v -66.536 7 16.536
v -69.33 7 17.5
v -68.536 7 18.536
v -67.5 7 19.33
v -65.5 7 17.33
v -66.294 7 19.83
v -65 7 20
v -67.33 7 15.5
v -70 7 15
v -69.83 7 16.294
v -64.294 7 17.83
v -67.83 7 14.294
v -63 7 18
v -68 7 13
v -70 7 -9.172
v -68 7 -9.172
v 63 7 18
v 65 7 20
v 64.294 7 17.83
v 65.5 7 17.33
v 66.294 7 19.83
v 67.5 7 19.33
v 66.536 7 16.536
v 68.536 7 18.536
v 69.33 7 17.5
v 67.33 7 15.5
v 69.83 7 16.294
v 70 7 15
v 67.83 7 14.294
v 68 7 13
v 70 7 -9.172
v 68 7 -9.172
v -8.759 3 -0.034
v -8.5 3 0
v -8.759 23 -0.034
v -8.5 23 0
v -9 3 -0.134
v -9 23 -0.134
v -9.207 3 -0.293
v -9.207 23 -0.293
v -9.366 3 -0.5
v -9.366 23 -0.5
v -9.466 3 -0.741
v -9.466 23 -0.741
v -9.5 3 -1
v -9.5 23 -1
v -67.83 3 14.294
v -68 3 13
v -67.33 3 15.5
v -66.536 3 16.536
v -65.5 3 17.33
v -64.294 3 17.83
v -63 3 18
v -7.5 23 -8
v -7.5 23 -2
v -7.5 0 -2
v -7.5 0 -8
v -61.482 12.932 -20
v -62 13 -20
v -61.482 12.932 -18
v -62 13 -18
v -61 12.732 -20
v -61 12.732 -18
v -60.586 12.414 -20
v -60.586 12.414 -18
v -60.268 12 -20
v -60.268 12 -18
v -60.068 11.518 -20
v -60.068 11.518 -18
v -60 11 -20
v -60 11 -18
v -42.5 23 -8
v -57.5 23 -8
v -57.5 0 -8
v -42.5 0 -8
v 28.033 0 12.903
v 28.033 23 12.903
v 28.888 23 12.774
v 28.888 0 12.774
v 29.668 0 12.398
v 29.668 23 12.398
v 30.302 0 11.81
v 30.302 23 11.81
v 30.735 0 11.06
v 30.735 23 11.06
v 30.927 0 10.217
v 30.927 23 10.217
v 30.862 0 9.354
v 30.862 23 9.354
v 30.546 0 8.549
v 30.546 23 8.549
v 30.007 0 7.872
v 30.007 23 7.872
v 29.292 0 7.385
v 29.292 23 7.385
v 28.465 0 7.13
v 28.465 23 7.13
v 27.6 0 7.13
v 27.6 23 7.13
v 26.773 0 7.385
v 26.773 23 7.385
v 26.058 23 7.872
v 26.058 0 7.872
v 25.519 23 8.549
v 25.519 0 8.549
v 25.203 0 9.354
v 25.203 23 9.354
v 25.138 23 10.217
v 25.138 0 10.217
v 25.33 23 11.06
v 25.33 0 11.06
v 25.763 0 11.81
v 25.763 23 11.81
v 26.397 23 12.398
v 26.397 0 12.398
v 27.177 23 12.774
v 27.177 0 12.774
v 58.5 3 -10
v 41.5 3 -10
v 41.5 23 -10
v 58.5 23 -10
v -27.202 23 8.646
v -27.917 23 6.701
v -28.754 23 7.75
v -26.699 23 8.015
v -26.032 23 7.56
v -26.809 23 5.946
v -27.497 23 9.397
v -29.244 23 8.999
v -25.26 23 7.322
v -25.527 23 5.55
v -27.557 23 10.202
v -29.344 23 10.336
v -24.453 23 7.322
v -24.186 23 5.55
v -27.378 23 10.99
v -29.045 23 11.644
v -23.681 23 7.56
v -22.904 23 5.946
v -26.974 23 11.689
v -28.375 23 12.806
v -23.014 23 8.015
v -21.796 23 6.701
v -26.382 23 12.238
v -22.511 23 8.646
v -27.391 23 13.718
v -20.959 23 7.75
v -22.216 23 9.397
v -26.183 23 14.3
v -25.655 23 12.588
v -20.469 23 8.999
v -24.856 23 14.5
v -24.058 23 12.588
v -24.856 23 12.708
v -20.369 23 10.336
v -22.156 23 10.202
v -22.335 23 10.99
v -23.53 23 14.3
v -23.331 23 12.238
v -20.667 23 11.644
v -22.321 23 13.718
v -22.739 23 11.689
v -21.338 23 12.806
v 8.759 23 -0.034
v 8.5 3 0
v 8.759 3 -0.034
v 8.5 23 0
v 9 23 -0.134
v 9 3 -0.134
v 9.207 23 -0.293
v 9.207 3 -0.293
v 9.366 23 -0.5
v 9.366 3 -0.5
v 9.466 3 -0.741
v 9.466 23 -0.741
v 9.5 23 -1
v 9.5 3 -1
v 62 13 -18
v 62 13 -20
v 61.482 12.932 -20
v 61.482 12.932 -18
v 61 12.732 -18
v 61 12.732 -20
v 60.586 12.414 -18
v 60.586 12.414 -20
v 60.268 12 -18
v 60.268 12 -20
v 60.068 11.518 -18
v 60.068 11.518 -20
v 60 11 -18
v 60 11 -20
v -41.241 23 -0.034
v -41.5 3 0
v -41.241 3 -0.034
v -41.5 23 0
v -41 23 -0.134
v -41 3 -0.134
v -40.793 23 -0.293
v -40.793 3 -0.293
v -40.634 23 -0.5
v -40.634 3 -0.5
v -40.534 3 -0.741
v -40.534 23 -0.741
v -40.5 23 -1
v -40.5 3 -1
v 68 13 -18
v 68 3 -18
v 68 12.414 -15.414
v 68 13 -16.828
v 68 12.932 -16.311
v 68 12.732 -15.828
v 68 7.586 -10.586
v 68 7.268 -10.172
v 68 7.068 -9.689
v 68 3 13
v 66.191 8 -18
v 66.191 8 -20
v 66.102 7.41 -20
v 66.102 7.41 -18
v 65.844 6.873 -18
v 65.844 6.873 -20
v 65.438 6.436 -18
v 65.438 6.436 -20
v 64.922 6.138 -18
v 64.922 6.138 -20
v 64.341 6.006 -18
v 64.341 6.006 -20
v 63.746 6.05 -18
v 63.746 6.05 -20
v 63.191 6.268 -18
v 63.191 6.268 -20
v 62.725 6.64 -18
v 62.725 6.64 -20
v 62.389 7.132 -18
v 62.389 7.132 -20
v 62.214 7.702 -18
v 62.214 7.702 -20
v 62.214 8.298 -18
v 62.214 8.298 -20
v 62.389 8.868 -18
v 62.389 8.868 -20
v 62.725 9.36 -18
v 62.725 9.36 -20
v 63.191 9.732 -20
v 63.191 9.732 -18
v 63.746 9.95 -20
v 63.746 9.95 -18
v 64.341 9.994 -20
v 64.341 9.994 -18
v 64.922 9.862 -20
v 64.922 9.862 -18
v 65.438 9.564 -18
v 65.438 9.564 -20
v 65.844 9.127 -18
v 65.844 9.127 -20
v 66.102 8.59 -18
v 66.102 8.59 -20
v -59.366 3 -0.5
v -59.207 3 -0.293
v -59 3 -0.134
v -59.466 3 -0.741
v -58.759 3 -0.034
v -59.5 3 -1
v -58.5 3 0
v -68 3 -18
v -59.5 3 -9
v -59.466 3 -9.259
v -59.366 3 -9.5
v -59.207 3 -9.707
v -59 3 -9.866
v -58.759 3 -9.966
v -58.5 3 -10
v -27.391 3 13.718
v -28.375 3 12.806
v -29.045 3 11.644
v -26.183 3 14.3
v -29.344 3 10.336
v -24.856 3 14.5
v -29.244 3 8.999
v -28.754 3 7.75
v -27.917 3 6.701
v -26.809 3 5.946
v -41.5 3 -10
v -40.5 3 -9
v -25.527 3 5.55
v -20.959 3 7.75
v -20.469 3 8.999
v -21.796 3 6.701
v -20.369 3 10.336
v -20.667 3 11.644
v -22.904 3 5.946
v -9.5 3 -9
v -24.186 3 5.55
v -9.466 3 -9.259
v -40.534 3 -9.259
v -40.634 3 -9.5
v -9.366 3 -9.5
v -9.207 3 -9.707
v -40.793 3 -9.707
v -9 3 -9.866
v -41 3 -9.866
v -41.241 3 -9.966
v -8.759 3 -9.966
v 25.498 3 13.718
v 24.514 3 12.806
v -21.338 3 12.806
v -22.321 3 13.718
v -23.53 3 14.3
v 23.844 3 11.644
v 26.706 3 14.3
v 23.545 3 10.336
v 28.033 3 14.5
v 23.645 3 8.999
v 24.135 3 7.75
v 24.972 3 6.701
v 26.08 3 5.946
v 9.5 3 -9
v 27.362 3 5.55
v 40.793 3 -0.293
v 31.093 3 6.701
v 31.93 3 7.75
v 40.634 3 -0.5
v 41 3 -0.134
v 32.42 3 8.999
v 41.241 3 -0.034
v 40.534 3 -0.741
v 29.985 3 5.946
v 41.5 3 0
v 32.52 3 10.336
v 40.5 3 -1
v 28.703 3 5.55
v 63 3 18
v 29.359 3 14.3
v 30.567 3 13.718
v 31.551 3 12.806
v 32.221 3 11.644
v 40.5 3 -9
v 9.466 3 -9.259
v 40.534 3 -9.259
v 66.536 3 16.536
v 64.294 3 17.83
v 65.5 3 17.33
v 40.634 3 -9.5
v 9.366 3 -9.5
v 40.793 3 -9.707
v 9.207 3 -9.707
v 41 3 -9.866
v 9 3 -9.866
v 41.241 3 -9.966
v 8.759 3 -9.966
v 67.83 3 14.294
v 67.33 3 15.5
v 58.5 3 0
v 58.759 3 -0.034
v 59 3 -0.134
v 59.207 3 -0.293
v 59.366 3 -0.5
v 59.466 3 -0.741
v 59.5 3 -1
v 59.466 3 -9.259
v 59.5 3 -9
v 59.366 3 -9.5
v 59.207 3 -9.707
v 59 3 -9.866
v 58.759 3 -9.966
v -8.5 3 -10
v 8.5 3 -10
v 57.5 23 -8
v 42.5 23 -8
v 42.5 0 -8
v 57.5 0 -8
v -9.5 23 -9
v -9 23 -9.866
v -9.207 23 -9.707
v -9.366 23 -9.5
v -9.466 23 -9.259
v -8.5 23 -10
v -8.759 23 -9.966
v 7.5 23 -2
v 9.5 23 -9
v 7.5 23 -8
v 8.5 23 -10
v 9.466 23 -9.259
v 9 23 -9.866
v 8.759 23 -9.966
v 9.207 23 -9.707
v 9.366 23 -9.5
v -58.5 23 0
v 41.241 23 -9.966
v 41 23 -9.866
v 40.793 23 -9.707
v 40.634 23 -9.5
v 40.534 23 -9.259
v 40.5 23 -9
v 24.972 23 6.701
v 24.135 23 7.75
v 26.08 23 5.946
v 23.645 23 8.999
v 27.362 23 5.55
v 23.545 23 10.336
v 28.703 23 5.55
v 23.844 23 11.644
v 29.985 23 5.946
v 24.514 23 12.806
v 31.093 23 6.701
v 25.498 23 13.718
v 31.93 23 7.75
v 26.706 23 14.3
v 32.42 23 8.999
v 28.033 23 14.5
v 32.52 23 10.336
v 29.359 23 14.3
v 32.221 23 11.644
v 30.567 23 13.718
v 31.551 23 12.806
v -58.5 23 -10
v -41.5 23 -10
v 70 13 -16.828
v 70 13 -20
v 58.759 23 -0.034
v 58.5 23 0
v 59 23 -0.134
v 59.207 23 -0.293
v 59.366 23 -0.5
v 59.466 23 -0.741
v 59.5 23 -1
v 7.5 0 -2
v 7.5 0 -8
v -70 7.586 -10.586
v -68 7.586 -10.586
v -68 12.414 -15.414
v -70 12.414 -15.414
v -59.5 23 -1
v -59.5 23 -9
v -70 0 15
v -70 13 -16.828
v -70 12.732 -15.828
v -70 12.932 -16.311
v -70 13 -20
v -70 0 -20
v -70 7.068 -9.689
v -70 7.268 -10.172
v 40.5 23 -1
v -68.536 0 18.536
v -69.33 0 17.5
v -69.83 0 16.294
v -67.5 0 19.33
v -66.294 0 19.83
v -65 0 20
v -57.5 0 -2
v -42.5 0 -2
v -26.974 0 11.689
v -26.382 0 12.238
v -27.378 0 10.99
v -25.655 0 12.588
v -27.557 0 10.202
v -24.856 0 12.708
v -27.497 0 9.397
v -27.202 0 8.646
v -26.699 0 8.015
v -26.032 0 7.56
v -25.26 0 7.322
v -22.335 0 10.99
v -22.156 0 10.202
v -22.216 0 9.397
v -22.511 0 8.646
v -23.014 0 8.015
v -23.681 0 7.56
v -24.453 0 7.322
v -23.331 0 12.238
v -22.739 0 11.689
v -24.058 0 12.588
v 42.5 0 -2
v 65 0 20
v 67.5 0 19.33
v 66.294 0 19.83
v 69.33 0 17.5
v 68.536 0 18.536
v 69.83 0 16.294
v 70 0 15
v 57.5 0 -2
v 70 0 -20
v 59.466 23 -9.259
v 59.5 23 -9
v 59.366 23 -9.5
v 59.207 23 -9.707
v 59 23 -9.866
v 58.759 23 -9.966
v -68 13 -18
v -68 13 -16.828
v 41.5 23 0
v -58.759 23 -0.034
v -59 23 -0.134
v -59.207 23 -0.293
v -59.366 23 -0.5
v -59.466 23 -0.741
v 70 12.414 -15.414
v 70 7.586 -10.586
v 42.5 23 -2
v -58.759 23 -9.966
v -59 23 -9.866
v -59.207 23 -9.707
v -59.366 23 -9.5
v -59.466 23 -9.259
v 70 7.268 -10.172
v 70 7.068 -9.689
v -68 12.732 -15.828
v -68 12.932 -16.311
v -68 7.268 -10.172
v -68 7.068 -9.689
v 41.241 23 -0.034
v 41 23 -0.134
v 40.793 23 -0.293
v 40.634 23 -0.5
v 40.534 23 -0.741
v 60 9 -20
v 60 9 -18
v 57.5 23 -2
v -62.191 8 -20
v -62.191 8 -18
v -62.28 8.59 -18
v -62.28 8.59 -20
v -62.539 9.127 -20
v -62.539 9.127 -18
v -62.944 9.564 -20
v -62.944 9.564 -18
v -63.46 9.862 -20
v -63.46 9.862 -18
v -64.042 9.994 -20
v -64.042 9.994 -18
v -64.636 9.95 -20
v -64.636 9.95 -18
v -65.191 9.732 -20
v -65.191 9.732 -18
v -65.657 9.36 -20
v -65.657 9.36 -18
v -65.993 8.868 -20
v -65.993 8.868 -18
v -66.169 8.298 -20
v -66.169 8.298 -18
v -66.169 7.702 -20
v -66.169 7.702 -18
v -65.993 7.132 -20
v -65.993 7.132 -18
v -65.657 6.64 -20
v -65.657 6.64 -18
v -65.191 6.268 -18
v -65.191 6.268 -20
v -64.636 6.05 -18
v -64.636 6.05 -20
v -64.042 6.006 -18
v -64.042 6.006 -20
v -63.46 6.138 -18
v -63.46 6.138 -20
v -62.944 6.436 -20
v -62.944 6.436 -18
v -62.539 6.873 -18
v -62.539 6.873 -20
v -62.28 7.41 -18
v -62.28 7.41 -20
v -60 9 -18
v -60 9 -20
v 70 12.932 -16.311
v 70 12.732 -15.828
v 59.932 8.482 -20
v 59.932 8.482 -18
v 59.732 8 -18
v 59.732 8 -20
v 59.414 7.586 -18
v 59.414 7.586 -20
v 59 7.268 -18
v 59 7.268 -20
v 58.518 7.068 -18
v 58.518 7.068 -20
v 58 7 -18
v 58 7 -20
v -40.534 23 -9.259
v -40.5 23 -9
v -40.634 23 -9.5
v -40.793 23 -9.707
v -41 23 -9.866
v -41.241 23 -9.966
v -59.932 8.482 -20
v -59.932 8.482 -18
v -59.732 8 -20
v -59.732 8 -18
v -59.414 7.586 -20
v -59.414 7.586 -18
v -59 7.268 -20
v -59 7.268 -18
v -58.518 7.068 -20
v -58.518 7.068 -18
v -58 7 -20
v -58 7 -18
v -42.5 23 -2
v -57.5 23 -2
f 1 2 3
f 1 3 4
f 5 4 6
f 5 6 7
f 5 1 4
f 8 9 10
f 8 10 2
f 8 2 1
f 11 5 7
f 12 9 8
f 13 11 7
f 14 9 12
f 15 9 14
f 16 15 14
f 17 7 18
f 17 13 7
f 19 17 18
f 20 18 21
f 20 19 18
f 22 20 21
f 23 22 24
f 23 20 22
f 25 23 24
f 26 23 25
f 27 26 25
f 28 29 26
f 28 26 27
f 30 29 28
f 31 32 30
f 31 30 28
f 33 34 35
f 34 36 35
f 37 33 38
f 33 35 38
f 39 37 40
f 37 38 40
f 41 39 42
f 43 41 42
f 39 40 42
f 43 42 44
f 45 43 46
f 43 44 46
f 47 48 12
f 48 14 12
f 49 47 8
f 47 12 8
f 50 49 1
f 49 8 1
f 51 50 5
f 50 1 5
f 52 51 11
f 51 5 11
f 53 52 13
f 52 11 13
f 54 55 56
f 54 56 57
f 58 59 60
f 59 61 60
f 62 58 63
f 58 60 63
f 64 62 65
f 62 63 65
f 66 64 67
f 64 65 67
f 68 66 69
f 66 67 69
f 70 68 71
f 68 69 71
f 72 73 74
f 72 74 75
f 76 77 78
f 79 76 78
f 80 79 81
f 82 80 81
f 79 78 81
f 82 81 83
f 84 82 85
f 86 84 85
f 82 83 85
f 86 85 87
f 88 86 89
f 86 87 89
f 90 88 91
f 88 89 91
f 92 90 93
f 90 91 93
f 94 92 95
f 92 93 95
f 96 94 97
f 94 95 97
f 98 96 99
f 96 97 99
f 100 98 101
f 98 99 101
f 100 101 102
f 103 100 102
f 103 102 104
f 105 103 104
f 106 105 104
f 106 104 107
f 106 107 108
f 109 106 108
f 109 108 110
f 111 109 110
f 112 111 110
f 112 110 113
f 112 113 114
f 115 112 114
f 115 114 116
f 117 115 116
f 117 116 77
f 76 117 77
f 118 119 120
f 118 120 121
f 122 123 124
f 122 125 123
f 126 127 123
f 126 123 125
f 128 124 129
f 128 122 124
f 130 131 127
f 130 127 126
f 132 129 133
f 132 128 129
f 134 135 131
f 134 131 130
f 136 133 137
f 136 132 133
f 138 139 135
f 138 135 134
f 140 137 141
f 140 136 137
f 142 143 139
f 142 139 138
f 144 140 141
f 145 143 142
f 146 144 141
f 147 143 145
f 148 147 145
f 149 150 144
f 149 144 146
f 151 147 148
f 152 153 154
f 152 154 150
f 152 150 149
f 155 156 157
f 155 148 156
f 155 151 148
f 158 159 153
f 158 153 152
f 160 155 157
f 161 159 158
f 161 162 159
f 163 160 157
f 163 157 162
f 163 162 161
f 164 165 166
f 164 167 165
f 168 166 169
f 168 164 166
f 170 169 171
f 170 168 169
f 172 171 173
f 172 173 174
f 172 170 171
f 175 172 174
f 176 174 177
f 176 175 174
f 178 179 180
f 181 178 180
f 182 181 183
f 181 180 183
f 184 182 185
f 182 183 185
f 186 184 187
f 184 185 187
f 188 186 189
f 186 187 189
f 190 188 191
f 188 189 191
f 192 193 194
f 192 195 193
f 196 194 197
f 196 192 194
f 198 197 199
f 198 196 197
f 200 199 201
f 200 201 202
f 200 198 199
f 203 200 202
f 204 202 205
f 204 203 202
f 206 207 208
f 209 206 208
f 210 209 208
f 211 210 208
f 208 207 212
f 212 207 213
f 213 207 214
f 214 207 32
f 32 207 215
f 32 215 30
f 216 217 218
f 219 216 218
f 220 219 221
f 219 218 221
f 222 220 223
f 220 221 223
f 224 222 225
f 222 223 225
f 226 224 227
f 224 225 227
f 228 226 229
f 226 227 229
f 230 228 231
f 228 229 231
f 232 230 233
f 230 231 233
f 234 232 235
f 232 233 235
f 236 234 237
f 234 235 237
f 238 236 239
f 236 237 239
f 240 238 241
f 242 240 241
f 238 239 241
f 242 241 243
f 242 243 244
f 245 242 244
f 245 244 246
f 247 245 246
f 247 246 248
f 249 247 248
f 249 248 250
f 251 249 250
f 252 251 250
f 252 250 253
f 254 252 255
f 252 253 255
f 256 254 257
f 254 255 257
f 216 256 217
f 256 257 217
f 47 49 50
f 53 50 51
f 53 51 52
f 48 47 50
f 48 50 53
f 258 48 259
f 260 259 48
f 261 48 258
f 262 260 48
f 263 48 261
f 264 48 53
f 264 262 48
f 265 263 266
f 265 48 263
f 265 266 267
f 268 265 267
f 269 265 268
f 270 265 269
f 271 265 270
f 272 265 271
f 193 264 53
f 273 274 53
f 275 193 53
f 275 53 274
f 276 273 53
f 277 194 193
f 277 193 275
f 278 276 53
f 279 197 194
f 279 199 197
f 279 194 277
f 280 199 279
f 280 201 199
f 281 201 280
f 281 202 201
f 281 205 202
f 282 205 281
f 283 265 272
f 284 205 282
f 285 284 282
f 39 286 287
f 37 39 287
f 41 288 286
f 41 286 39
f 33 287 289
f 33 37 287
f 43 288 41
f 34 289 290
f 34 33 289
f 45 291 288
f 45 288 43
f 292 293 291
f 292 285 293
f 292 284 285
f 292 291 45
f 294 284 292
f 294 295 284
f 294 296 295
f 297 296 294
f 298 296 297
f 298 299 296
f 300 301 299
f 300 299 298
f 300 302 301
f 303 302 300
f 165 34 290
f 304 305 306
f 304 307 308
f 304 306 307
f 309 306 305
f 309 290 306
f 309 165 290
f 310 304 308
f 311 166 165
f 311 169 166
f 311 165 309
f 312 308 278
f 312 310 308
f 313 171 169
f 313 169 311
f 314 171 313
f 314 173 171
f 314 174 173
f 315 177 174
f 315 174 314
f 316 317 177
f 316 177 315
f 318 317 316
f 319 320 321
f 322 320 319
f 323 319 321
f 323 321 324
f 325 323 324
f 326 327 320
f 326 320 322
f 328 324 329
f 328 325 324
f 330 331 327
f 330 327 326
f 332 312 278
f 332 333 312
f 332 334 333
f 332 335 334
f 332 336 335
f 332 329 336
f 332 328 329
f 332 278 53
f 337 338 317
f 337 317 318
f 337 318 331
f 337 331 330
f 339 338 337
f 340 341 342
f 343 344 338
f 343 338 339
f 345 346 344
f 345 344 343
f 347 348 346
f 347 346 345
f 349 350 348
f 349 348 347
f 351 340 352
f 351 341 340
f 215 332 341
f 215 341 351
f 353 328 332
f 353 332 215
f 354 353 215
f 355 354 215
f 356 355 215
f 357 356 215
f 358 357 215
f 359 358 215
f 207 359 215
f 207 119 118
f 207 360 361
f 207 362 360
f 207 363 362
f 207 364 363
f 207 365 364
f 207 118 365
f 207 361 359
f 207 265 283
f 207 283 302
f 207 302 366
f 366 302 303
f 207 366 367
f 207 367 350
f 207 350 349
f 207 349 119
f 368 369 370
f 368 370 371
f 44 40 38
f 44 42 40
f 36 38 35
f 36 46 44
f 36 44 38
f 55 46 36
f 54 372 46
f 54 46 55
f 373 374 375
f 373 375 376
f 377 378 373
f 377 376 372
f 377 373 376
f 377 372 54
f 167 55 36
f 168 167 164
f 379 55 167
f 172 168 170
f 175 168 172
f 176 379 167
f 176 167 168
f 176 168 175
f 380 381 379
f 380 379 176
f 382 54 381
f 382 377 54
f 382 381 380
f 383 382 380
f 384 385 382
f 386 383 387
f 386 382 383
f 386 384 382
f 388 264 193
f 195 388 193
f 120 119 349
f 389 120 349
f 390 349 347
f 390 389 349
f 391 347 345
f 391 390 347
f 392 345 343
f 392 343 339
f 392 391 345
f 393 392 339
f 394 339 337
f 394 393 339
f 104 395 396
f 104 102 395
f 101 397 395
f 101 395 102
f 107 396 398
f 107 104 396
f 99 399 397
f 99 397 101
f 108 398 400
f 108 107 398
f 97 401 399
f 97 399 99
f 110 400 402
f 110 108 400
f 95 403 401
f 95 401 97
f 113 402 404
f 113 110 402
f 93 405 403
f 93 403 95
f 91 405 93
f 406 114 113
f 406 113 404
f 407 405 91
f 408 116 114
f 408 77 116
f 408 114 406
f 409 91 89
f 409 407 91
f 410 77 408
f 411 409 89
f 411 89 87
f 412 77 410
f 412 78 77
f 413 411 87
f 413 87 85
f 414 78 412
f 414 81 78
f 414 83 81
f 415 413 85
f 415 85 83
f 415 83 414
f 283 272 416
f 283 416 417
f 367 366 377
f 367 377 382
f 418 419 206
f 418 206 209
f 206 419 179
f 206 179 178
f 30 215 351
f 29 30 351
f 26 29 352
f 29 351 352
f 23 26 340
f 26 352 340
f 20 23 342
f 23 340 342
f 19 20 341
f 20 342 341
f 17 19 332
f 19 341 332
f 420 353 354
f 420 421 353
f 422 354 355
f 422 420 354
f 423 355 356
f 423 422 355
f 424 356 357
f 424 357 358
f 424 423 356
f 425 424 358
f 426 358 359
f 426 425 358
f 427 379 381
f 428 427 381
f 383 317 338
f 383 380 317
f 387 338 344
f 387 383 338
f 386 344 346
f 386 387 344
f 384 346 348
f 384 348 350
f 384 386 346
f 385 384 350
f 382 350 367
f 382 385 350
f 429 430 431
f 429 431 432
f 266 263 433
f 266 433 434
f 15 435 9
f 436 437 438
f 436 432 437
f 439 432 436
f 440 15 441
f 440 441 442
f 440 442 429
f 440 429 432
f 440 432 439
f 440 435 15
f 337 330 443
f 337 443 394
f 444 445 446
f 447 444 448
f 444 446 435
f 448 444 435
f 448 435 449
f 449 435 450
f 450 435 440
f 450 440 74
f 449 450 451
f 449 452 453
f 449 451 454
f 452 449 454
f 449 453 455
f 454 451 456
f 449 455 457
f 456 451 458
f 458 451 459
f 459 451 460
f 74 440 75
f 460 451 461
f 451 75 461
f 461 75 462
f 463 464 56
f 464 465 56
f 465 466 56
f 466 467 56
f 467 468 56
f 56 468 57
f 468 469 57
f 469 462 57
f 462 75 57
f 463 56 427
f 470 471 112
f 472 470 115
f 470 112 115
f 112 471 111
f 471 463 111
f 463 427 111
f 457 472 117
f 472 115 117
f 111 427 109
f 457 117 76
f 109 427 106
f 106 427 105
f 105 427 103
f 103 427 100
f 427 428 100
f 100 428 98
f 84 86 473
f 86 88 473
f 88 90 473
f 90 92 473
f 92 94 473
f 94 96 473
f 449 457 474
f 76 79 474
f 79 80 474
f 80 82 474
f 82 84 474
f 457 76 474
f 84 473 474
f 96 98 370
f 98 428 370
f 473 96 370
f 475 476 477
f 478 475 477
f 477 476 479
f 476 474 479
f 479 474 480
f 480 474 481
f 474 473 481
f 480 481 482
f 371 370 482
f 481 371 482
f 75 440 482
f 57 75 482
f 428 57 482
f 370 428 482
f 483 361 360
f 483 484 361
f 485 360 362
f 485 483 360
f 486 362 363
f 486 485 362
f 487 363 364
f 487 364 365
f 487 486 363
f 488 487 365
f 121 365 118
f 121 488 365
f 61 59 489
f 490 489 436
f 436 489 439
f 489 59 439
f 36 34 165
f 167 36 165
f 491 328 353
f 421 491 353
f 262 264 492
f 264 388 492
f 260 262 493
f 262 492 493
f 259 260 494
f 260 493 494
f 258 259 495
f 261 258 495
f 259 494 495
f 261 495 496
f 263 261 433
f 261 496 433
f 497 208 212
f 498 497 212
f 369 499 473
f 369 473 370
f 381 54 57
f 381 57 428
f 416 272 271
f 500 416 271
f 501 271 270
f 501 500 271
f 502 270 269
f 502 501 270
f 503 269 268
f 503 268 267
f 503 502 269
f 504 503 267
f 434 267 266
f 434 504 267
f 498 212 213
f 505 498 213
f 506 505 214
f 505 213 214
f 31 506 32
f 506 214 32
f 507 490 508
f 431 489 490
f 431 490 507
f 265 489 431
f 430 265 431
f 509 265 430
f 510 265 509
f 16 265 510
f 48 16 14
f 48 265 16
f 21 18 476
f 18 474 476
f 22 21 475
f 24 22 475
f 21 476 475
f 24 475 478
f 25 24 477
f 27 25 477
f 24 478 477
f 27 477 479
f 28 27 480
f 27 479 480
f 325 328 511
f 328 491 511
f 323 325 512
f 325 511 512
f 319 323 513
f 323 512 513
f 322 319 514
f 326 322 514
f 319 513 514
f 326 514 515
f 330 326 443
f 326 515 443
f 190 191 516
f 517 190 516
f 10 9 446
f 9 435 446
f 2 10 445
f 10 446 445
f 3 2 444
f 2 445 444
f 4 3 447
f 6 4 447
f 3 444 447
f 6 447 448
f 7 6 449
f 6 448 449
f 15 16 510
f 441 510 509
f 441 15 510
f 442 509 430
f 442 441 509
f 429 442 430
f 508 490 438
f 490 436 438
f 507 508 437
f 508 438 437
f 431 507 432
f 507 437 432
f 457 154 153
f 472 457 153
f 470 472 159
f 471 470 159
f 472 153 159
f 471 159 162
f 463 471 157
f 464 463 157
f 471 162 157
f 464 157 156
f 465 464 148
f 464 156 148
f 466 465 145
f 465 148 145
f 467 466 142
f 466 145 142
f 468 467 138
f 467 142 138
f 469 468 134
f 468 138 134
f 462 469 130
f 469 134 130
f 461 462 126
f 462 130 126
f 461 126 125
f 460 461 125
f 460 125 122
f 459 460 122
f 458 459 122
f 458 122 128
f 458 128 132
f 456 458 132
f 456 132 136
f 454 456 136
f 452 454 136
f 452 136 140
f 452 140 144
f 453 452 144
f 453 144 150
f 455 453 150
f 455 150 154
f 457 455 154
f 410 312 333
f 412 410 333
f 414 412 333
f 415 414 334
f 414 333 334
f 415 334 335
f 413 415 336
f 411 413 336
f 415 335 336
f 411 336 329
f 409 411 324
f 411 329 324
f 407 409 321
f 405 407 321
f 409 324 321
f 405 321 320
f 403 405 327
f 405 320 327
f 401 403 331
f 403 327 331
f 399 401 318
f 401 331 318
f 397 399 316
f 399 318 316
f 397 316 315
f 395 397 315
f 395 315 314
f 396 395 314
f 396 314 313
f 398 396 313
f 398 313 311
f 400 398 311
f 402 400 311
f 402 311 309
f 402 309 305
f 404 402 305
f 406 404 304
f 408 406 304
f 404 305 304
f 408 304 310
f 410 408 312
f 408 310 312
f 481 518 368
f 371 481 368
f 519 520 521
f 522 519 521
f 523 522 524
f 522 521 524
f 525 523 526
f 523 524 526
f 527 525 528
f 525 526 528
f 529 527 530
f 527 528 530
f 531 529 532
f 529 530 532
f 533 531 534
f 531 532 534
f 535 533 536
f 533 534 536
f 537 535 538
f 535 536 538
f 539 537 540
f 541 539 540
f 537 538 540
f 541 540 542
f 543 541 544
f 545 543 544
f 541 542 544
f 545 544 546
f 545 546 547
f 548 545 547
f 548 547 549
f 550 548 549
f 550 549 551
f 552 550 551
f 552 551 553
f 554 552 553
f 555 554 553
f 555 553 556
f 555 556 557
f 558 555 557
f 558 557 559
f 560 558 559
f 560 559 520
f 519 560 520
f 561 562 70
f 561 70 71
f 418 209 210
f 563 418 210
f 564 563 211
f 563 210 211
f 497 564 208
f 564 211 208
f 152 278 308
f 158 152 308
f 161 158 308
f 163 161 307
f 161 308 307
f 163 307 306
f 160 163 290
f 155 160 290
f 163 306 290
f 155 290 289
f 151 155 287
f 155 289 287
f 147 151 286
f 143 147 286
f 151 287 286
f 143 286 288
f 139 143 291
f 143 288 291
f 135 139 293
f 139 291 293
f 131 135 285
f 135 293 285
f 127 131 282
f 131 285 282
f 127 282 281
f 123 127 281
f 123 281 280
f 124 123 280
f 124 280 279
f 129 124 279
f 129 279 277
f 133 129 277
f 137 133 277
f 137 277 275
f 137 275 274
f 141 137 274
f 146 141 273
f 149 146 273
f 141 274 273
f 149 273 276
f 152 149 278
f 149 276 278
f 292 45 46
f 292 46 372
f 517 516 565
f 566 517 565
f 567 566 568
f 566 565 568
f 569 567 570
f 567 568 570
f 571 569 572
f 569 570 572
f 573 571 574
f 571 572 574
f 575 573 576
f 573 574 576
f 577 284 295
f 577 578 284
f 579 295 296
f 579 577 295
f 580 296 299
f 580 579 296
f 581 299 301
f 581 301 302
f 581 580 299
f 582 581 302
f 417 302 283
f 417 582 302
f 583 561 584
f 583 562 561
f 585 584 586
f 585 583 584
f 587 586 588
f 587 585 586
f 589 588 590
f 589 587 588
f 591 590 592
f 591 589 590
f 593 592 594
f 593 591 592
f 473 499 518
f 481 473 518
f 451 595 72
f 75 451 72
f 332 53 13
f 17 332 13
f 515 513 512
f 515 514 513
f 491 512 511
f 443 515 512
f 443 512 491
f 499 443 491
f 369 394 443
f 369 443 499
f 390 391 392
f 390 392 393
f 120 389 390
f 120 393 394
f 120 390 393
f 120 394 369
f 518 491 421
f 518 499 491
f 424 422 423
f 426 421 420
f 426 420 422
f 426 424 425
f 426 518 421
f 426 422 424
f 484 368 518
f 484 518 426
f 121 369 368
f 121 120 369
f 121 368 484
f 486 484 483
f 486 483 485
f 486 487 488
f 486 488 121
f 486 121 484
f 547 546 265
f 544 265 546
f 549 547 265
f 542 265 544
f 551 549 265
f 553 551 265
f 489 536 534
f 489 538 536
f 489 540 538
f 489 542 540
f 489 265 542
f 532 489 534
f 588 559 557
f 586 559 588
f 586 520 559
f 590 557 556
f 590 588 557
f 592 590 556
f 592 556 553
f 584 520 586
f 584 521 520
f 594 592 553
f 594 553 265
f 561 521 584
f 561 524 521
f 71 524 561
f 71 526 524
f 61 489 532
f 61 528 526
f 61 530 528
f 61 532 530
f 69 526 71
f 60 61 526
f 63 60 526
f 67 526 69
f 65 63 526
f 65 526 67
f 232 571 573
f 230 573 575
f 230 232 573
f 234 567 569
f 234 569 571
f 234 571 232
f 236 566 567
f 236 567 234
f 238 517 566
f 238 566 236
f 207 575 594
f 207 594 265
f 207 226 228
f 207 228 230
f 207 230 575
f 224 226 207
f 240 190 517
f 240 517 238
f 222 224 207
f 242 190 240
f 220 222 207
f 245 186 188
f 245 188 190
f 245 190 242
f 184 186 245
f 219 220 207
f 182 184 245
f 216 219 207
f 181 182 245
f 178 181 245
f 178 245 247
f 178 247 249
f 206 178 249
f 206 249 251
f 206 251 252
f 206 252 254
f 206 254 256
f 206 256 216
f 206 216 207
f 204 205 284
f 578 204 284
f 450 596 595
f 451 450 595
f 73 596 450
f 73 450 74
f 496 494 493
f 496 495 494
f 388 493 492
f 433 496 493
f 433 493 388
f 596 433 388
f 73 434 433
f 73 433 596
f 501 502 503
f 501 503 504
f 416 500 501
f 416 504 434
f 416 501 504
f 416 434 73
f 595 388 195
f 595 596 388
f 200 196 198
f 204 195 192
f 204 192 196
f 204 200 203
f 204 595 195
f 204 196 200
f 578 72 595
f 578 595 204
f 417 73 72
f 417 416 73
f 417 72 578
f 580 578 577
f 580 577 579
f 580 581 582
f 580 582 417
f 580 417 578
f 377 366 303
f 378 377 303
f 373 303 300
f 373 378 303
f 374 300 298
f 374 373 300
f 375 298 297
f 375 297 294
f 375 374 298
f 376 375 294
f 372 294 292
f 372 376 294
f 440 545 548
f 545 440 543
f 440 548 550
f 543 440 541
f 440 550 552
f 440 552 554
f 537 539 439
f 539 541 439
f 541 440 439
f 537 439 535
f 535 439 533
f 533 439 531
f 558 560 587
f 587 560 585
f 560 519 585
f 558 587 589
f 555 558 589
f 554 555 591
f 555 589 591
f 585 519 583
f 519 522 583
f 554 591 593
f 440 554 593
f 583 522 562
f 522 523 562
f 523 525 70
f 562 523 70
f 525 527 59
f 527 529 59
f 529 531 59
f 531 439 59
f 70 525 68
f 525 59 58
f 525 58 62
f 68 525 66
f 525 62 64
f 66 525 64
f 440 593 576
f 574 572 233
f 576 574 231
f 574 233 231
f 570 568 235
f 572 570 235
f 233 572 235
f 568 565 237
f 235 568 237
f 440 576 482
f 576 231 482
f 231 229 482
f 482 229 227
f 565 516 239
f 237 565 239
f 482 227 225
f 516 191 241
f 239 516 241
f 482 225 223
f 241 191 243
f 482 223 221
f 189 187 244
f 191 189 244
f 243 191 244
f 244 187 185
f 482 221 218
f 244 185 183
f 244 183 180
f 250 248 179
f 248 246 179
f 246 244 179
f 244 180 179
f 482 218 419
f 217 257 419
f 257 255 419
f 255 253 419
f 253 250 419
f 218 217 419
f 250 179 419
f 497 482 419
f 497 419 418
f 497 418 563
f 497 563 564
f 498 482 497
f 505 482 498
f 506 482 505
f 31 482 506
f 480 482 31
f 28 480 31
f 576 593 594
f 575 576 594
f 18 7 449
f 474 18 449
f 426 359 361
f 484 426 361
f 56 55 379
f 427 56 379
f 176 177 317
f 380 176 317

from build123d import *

# Parameters (mm, degrees)
ESQUISSE1_W                      = 140
ESQUISSE1_H                      = 40
BOSS_EXTRU_1_DEPTH               = 3
BOSS_EXTRU_5_DEPTH               = 10
CHANFREIN1_SIZE                  = 6
ESQUISSE15_R                     = 2
ENL_V_MAT_EXTRU_7_DEPTH          = 81.703159789
ESQUISSE18_W                     = 60
ESQUISSE18_H                     = 2
BOSS_EXTRU_6_DEPTH               = 4
CONG_2_R                         = 5
CONG_3_R                         = 2
SYM_TRIE1_OUTLINE_W              = 4
SYM_TRIE1_OUTLINE_H              = 2
SYM_TRIE1_DEPTH                  = 62.191181732
SYM_TRIE1_START                  = 68
SYM_TRIE1_2_DEPTH                = 2
SYM_TRIE1_START_2                = 66.191181932
SYM_TRIE1_3_OUTLINE_W            = 10
SYM_TRIE1_3_OUTLINE_H            = 2
SYM_TRIE1_3_OUTLINE_W_2          = 4
SYM_TRIE1_3_DEPTH                = 1.808818068
SYM_TRIE1_START_3                = 62
SYM_TRIE1_4_OUTLINE_W            = 4
SYM_TRIE1_4_OUTLINE_H            = 2
SYM_TRIE1_4_DEPTH                = 6
SYM_TRIE1_5_OUTLINE_W            = 6
SYM_TRIE1_5_OUTLINE_H            = 2
SYM_TRIE1_5_DEPTH                = 0.191181732
SYM_TRIE1_START_4                = -20
SYM_TRIE1_6_DEPTH                = 2
SYM_TRIE1_START_5                = 2
SYM_TRIE1_7_DEPTH                = 5
CONG_4_R                         = 5
ESQUISSE2_W                      = 19
ESQUISSE2_H                      = 10
BOSS_EXTRU_7_DEPTH               = 20
ESQUISSE19_W                     = 15
ESQUISSE19_H                     = 6
ENL_V_MAT_EXTRU_8_DEPTH          = 77.347887987
CONG_5_R                         = 1
R_P_TITION_LIN_AIRE1_COUNT       = 3
R_P_TITION_LIN_AIRE1_PITCH       = 50
CONG_5_OF_R_P_TITION_LIN_AIRE1_R = 1
ESQUISSE23_R                     = 4.5
BOSS_EXTRU_9_DEPTH               = 20
ESQUISSE24_R                     = 2.70848906
ESQUISSE24_R_2                   = 2.902672956
ENL_V_MAT_EXTRU_10_DEPTH         = 77.347887987


with BuildPart() as part:
    # Esquisse1 → Boss.-Extru.1 (new body)
    with BuildSketch(Plane(origin=(0, 0, 0), x_dir=(1, 0, 0), z_dir=(0, 1, 0))):
        Rectangle(ESQUISSE1_W, ESQUISSE1_H)
    extrude(amount=BOSS_EXTRU_1_DEPTH)

    # Esquisse13 → Boss.-Extru.5 (add)
    with BuildSketch(Plane(origin=(0, 3, 0), x_dir=(1, 0, 0), z_dir=(0, 1, 0))):
        Polygon((-70, 20), (-60, 20), (-60, 18), (-68, 18), (-68, 10), (-70, 10), align=None)
    extrude(amount=BOSS_EXTRU_5_DEPTH)

    # Chanfrein1
    chanfrein1_edges = [part.edges().sort_by_distance(p)[0] for p in [
        (-69, 13, -10),
    ]]
    chamfer(chanfrein1_edges, length=CHANFREIN1_SIZE)

    # Esquisse15 → Enlèv. mat.-Extru.7 (cut, through all)
    with BuildSketch(Plane.XY.offset(-18)):
        with Locations((-64.191181832, 8)):
            Circle(ESQUISSE15_R)
    extrude(amount=-ENL_V_MAT_EXTRU_7_DEPTH, mode=Mode.SUBTRACT)

    # Esquisse18 → Boss.-Extru.6 (add)
    with BuildSketch(Plane(origin=(0, 3, 0), x_dir=(1, 0, 0), z_dir=(0, 1, 0))):
        Polygon((-68, 10), (-68, -18), (0, -18), (0, -20), (-70, -20), (-70, 10), align=None)
        with Locations((-30, 19)):
            Rectangle(ESQUISSE18_W, ESQUISSE18_H)
    extrude(amount=BOSS_EXTRU_6_DEPTH)

    # Congé2
    cong_2_edges = [part.edges().sort_by_distance(p)[0] for p in [
        (-68, 5, 18),
        (-70, 3.5, 20),
    ]]
    fillet(cong_2_edges, radius=CONG_2_R)

    # Congé3
    cong_3_edges = [part.edges().sort_by_distance(p)[0] for p in [
        (-60, 13, -19),
        (-69, 13, -16),
        (-69, 7, -10),
        (-60, 7, -19),
    ]]
    fillet(cong_3_edges, radius=CONG_3_R)

    # Symétrie1: read off the stored shape, not the designer's step
    # Symétrie1 outline → Symétrie1 (add)
    with BuildSketch(Plane.YZ):
        with Locations((5, -19)):
            Rectangle(SYM_TRIE1_OUTLINE_W, SYM_TRIE1_OUTLINE_H)
        with Locations((5, 19)):
            Rectangle(SYM_TRIE1_OUTLINE_W, SYM_TRIE1_OUTLINE_H)
    extrude(amount=SYM_TRIE1_DEPTH)

    # Sym_trie1 2 outline → Sym_trie1 2 (add)
    with BuildSketch(Plane.YZ.offset(SYM_TRIE1_START)):
        with BuildLine():
            Line((13, -20), (13, -16.828427125))
            ThreePointArc((13, -16.828427125), (12.847759065, -16.06306026), (12.414213562, -15.414213562))
            Line((12.414213562, -15.414213562), (7.585786438, -10.585786438))
            ThreePointArc((7.585786438, -10.585786438), (7.152240935, -9.93693974), (7, -9.171572875))
            Line((7, -9.171572875), (7, 20))
            Line((7, 20), (3, 20))
            Line((3, 20), (3, -20))
            Line((3, -20), (13, -20))
        make_face()
    extrude(amount=SYM_TRIE1_2_DEPTH)

    # Sym_trie1 3 outline → Sym_trie1 3 (add)
    with BuildSketch(Plane.YZ.offset(SYM_TRIE1_START_2)):
        with Locations((8, -19)):
            Rectangle(SYM_TRIE1_3_OUTLINE_W, SYM_TRIE1_3_OUTLINE_H)
        with Locations((5, 19)):
            Rectangle(SYM_TRIE1_3_OUTLINE_W_2, SYM_TRIE1_3_OUTLINE_H)
    extrude(amount=SYM_TRIE1_3_DEPTH)

    # Sym_trie1 4 outline → Sym_trie1 4 (add)
    with BuildSketch(Plane.YZ.offset(SYM_TRIE1_START_3)):
        with Locations((5, 19)):
            Rectangle(SYM_TRIE1_4_OUTLINE_W, SYM_TRIE1_4_OUTLINE_H)
    extrude(amount=SYM_TRIE1_4_DEPTH)

    # Sym_trie1 5 outline → Sym_trie1 5 (add)
    with BuildSketch(Plane.YZ.offset(SYM_TRIE1_START_3)):
        with Locations((10, -19)):
            Rectangle(SYM_TRIE1_5_OUTLINE_W, SYM_TRIE1_5_OUTLINE_H)
    extrude(amount=SYM_TRIE1_5_DEPTH)

    # Sym_trie1 6 outline → Sym_trie1 6 (add)
    with BuildSketch(Plane.XY.offset(SYM_TRIE1_START_4)):
        with BuildLine():
            ThreePointArc((62, 13), (60.585786438, 12.414213562), (60, 11))
            Line((60, 11), (60, 9))
            ThreePointArc((60, 9), (59.414213562, 7.585786438), (58, 7))
            Line((58, 7), (62, 7))
            Line((62, 7), (62, 13))
        make_face()
        with BuildLine():
            Line((66.191181932, 13), (62.191181732, 13))
            Line((62.191181732, 13), (62.191181832, 8))
            ThreePointArc((62.191181832, 8), (64.191181832, 10), (66.191181832, 8))
            Line((66.191181832, 8), (66.191181932, 13))
        make_face()
        with BuildLine():
            Line((62.191181832, 8), (62.191181732, 3))
            Line((62.191181732, 3), (66.191181932, 3))
            Line((66.191181932, 3), (66.191181832, 8))
            ThreePointArc((66.191181832, 8), (64.191181832, 6), (62.191181832, 8))
        make_face()
    extrude(amount=SYM_TRIE1_6_DEPTH)

    # Sym_trie1 7 outline → Sym_trie1 7 (add)
    with BuildSketch(Plane(origin=(0, 0, 0), x_dir=(1, 0, 0), z_dir=(0, 1, 0)).offset(SYM_TRIE1_START_5)):
        with BuildLine():
            Line((68, -18), (68, -13))
            ThreePointArc((68, -13), (66.535533906, -16.535533906), (63, -18))
            Line((63, -18), (68, -18))
        make_face()
    extrude(amount=SYM_TRIE1_7_DEPTH)

    # Congé4
    cong_4_edges = [part.edges().sort_by_distance(p)[0] for p in [
        (70, 3.5, 20),
    ]]
    fillet(cong_4_edges, radius=CONG_4_R)

    # Esquisse2 → Boss.-Extru.7 (add)
    with BuildSketch(Plane(origin=(0, 3, 0), x_dir=(1, 0, 0), z_dir=(0, 1, 0))):
        with Locations((-50, 5)):
            Rectangle(ESQUISSE2_W, ESQUISSE2_H)
    boss_extru_7 = extrude(amount=BOSS_EXTRU_7_DEPTH)

    # Esquisse19 → Enlèv. mat.-Extru.8 (cut, through all)
    with BuildSketch(Plane(origin=(0, 23, 0), x_dir=(1, 0, 0), z_dir=(0, 1, 0))):
        with Locations((-50, 5)):
            Rectangle(ESQUISSE19_W, ESQUISSE19_H)
    enl_v_mat_extru_8 = extrude(amount=-ENL_V_MAT_EXTRU_8_DEPTH, mode=Mode.SUBTRACT)

    # Congé5
    cong_5_edges = [part.edges().sort_by_distance(p)[0] for p in [
        (-40.5, 13, 0),
        (-40.5, 13, -10),
        (-59.5, 13, -10),
        (-59.5, 13, 0),
    ]]
    fillet(cong_5_edges, radius=CONG_5_R)

    # Répétition linéaire1: Boss.-Extru.7, Enlèv. mat.-Extru.8 ×3
    with Locations(*[(i * R_P_TITION_LIN_AIRE1_PITCH, 0, 0) for i in range(1, R_P_TITION_LIN_AIRE1_COUNT)]):
        add(boss_extru_7)
        add(enl_v_mat_extru_8, mode=Mode.SUBTRACT)

    # Congé5 of Répétition linéaire1
    cong_5_of_r_p_tition_lin_aire1_edges = [part.edges().sort_by_distance(p)[0] for p in [
        (9.5, 13, 0),
        (9.5, 13, -10),
        (-9.5, 13, -10),
        (-9.5, 13, 0),
        (59.5, 13, 0),
        (59.5, 13, -10),
        (40.5, 13, -10),
        (40.5, 13, 0),
    ]]
    fillet(cong_5_of_r_p_tition_lin_aire1_edges, radius=CONG_5_OF_R_P_TITION_LIN_AIRE1_R)

    # Esquisse23 → Boss.-Extru.9 (add)
    with BuildSketch(Plane(origin=(0, 3, 0), x_dir=(1, 0, 0), z_dir=(0, 1, 0))):
        with Locations(Location((-24.856422556, -10, 0), (0, 0, 270))):
            Circle(ESQUISSE23_R)
        with Locations(Location((28.032520994, -10, 0), (0, 0, 270))):
            Circle(ESQUISSE23_R)
    extrude(amount=BOSS_EXTRU_9_DEPTH)

    # Esquisse24 → Enlèv. mat.-Extru.10 (cut, through all)
    with BuildSketch(Plane(origin=(0, 23, 0), x_dir=(1, 0, 0), z_dir=(0, 1, 0))):
        with Locations(Location((-24.856422556, -10, 0), (0, 0, 270))):
            Circle(ESQUISSE24_R)
        with Locations(Location((28.032520994, -10, 0), (0, 0, 270))):
            Circle(ESQUISSE24_R_2)
    extrude(amount=-ENL_V_MAT_EXTRU_10_DEPTH, mode=Mode.SUBTRACT)


solid = part.part
